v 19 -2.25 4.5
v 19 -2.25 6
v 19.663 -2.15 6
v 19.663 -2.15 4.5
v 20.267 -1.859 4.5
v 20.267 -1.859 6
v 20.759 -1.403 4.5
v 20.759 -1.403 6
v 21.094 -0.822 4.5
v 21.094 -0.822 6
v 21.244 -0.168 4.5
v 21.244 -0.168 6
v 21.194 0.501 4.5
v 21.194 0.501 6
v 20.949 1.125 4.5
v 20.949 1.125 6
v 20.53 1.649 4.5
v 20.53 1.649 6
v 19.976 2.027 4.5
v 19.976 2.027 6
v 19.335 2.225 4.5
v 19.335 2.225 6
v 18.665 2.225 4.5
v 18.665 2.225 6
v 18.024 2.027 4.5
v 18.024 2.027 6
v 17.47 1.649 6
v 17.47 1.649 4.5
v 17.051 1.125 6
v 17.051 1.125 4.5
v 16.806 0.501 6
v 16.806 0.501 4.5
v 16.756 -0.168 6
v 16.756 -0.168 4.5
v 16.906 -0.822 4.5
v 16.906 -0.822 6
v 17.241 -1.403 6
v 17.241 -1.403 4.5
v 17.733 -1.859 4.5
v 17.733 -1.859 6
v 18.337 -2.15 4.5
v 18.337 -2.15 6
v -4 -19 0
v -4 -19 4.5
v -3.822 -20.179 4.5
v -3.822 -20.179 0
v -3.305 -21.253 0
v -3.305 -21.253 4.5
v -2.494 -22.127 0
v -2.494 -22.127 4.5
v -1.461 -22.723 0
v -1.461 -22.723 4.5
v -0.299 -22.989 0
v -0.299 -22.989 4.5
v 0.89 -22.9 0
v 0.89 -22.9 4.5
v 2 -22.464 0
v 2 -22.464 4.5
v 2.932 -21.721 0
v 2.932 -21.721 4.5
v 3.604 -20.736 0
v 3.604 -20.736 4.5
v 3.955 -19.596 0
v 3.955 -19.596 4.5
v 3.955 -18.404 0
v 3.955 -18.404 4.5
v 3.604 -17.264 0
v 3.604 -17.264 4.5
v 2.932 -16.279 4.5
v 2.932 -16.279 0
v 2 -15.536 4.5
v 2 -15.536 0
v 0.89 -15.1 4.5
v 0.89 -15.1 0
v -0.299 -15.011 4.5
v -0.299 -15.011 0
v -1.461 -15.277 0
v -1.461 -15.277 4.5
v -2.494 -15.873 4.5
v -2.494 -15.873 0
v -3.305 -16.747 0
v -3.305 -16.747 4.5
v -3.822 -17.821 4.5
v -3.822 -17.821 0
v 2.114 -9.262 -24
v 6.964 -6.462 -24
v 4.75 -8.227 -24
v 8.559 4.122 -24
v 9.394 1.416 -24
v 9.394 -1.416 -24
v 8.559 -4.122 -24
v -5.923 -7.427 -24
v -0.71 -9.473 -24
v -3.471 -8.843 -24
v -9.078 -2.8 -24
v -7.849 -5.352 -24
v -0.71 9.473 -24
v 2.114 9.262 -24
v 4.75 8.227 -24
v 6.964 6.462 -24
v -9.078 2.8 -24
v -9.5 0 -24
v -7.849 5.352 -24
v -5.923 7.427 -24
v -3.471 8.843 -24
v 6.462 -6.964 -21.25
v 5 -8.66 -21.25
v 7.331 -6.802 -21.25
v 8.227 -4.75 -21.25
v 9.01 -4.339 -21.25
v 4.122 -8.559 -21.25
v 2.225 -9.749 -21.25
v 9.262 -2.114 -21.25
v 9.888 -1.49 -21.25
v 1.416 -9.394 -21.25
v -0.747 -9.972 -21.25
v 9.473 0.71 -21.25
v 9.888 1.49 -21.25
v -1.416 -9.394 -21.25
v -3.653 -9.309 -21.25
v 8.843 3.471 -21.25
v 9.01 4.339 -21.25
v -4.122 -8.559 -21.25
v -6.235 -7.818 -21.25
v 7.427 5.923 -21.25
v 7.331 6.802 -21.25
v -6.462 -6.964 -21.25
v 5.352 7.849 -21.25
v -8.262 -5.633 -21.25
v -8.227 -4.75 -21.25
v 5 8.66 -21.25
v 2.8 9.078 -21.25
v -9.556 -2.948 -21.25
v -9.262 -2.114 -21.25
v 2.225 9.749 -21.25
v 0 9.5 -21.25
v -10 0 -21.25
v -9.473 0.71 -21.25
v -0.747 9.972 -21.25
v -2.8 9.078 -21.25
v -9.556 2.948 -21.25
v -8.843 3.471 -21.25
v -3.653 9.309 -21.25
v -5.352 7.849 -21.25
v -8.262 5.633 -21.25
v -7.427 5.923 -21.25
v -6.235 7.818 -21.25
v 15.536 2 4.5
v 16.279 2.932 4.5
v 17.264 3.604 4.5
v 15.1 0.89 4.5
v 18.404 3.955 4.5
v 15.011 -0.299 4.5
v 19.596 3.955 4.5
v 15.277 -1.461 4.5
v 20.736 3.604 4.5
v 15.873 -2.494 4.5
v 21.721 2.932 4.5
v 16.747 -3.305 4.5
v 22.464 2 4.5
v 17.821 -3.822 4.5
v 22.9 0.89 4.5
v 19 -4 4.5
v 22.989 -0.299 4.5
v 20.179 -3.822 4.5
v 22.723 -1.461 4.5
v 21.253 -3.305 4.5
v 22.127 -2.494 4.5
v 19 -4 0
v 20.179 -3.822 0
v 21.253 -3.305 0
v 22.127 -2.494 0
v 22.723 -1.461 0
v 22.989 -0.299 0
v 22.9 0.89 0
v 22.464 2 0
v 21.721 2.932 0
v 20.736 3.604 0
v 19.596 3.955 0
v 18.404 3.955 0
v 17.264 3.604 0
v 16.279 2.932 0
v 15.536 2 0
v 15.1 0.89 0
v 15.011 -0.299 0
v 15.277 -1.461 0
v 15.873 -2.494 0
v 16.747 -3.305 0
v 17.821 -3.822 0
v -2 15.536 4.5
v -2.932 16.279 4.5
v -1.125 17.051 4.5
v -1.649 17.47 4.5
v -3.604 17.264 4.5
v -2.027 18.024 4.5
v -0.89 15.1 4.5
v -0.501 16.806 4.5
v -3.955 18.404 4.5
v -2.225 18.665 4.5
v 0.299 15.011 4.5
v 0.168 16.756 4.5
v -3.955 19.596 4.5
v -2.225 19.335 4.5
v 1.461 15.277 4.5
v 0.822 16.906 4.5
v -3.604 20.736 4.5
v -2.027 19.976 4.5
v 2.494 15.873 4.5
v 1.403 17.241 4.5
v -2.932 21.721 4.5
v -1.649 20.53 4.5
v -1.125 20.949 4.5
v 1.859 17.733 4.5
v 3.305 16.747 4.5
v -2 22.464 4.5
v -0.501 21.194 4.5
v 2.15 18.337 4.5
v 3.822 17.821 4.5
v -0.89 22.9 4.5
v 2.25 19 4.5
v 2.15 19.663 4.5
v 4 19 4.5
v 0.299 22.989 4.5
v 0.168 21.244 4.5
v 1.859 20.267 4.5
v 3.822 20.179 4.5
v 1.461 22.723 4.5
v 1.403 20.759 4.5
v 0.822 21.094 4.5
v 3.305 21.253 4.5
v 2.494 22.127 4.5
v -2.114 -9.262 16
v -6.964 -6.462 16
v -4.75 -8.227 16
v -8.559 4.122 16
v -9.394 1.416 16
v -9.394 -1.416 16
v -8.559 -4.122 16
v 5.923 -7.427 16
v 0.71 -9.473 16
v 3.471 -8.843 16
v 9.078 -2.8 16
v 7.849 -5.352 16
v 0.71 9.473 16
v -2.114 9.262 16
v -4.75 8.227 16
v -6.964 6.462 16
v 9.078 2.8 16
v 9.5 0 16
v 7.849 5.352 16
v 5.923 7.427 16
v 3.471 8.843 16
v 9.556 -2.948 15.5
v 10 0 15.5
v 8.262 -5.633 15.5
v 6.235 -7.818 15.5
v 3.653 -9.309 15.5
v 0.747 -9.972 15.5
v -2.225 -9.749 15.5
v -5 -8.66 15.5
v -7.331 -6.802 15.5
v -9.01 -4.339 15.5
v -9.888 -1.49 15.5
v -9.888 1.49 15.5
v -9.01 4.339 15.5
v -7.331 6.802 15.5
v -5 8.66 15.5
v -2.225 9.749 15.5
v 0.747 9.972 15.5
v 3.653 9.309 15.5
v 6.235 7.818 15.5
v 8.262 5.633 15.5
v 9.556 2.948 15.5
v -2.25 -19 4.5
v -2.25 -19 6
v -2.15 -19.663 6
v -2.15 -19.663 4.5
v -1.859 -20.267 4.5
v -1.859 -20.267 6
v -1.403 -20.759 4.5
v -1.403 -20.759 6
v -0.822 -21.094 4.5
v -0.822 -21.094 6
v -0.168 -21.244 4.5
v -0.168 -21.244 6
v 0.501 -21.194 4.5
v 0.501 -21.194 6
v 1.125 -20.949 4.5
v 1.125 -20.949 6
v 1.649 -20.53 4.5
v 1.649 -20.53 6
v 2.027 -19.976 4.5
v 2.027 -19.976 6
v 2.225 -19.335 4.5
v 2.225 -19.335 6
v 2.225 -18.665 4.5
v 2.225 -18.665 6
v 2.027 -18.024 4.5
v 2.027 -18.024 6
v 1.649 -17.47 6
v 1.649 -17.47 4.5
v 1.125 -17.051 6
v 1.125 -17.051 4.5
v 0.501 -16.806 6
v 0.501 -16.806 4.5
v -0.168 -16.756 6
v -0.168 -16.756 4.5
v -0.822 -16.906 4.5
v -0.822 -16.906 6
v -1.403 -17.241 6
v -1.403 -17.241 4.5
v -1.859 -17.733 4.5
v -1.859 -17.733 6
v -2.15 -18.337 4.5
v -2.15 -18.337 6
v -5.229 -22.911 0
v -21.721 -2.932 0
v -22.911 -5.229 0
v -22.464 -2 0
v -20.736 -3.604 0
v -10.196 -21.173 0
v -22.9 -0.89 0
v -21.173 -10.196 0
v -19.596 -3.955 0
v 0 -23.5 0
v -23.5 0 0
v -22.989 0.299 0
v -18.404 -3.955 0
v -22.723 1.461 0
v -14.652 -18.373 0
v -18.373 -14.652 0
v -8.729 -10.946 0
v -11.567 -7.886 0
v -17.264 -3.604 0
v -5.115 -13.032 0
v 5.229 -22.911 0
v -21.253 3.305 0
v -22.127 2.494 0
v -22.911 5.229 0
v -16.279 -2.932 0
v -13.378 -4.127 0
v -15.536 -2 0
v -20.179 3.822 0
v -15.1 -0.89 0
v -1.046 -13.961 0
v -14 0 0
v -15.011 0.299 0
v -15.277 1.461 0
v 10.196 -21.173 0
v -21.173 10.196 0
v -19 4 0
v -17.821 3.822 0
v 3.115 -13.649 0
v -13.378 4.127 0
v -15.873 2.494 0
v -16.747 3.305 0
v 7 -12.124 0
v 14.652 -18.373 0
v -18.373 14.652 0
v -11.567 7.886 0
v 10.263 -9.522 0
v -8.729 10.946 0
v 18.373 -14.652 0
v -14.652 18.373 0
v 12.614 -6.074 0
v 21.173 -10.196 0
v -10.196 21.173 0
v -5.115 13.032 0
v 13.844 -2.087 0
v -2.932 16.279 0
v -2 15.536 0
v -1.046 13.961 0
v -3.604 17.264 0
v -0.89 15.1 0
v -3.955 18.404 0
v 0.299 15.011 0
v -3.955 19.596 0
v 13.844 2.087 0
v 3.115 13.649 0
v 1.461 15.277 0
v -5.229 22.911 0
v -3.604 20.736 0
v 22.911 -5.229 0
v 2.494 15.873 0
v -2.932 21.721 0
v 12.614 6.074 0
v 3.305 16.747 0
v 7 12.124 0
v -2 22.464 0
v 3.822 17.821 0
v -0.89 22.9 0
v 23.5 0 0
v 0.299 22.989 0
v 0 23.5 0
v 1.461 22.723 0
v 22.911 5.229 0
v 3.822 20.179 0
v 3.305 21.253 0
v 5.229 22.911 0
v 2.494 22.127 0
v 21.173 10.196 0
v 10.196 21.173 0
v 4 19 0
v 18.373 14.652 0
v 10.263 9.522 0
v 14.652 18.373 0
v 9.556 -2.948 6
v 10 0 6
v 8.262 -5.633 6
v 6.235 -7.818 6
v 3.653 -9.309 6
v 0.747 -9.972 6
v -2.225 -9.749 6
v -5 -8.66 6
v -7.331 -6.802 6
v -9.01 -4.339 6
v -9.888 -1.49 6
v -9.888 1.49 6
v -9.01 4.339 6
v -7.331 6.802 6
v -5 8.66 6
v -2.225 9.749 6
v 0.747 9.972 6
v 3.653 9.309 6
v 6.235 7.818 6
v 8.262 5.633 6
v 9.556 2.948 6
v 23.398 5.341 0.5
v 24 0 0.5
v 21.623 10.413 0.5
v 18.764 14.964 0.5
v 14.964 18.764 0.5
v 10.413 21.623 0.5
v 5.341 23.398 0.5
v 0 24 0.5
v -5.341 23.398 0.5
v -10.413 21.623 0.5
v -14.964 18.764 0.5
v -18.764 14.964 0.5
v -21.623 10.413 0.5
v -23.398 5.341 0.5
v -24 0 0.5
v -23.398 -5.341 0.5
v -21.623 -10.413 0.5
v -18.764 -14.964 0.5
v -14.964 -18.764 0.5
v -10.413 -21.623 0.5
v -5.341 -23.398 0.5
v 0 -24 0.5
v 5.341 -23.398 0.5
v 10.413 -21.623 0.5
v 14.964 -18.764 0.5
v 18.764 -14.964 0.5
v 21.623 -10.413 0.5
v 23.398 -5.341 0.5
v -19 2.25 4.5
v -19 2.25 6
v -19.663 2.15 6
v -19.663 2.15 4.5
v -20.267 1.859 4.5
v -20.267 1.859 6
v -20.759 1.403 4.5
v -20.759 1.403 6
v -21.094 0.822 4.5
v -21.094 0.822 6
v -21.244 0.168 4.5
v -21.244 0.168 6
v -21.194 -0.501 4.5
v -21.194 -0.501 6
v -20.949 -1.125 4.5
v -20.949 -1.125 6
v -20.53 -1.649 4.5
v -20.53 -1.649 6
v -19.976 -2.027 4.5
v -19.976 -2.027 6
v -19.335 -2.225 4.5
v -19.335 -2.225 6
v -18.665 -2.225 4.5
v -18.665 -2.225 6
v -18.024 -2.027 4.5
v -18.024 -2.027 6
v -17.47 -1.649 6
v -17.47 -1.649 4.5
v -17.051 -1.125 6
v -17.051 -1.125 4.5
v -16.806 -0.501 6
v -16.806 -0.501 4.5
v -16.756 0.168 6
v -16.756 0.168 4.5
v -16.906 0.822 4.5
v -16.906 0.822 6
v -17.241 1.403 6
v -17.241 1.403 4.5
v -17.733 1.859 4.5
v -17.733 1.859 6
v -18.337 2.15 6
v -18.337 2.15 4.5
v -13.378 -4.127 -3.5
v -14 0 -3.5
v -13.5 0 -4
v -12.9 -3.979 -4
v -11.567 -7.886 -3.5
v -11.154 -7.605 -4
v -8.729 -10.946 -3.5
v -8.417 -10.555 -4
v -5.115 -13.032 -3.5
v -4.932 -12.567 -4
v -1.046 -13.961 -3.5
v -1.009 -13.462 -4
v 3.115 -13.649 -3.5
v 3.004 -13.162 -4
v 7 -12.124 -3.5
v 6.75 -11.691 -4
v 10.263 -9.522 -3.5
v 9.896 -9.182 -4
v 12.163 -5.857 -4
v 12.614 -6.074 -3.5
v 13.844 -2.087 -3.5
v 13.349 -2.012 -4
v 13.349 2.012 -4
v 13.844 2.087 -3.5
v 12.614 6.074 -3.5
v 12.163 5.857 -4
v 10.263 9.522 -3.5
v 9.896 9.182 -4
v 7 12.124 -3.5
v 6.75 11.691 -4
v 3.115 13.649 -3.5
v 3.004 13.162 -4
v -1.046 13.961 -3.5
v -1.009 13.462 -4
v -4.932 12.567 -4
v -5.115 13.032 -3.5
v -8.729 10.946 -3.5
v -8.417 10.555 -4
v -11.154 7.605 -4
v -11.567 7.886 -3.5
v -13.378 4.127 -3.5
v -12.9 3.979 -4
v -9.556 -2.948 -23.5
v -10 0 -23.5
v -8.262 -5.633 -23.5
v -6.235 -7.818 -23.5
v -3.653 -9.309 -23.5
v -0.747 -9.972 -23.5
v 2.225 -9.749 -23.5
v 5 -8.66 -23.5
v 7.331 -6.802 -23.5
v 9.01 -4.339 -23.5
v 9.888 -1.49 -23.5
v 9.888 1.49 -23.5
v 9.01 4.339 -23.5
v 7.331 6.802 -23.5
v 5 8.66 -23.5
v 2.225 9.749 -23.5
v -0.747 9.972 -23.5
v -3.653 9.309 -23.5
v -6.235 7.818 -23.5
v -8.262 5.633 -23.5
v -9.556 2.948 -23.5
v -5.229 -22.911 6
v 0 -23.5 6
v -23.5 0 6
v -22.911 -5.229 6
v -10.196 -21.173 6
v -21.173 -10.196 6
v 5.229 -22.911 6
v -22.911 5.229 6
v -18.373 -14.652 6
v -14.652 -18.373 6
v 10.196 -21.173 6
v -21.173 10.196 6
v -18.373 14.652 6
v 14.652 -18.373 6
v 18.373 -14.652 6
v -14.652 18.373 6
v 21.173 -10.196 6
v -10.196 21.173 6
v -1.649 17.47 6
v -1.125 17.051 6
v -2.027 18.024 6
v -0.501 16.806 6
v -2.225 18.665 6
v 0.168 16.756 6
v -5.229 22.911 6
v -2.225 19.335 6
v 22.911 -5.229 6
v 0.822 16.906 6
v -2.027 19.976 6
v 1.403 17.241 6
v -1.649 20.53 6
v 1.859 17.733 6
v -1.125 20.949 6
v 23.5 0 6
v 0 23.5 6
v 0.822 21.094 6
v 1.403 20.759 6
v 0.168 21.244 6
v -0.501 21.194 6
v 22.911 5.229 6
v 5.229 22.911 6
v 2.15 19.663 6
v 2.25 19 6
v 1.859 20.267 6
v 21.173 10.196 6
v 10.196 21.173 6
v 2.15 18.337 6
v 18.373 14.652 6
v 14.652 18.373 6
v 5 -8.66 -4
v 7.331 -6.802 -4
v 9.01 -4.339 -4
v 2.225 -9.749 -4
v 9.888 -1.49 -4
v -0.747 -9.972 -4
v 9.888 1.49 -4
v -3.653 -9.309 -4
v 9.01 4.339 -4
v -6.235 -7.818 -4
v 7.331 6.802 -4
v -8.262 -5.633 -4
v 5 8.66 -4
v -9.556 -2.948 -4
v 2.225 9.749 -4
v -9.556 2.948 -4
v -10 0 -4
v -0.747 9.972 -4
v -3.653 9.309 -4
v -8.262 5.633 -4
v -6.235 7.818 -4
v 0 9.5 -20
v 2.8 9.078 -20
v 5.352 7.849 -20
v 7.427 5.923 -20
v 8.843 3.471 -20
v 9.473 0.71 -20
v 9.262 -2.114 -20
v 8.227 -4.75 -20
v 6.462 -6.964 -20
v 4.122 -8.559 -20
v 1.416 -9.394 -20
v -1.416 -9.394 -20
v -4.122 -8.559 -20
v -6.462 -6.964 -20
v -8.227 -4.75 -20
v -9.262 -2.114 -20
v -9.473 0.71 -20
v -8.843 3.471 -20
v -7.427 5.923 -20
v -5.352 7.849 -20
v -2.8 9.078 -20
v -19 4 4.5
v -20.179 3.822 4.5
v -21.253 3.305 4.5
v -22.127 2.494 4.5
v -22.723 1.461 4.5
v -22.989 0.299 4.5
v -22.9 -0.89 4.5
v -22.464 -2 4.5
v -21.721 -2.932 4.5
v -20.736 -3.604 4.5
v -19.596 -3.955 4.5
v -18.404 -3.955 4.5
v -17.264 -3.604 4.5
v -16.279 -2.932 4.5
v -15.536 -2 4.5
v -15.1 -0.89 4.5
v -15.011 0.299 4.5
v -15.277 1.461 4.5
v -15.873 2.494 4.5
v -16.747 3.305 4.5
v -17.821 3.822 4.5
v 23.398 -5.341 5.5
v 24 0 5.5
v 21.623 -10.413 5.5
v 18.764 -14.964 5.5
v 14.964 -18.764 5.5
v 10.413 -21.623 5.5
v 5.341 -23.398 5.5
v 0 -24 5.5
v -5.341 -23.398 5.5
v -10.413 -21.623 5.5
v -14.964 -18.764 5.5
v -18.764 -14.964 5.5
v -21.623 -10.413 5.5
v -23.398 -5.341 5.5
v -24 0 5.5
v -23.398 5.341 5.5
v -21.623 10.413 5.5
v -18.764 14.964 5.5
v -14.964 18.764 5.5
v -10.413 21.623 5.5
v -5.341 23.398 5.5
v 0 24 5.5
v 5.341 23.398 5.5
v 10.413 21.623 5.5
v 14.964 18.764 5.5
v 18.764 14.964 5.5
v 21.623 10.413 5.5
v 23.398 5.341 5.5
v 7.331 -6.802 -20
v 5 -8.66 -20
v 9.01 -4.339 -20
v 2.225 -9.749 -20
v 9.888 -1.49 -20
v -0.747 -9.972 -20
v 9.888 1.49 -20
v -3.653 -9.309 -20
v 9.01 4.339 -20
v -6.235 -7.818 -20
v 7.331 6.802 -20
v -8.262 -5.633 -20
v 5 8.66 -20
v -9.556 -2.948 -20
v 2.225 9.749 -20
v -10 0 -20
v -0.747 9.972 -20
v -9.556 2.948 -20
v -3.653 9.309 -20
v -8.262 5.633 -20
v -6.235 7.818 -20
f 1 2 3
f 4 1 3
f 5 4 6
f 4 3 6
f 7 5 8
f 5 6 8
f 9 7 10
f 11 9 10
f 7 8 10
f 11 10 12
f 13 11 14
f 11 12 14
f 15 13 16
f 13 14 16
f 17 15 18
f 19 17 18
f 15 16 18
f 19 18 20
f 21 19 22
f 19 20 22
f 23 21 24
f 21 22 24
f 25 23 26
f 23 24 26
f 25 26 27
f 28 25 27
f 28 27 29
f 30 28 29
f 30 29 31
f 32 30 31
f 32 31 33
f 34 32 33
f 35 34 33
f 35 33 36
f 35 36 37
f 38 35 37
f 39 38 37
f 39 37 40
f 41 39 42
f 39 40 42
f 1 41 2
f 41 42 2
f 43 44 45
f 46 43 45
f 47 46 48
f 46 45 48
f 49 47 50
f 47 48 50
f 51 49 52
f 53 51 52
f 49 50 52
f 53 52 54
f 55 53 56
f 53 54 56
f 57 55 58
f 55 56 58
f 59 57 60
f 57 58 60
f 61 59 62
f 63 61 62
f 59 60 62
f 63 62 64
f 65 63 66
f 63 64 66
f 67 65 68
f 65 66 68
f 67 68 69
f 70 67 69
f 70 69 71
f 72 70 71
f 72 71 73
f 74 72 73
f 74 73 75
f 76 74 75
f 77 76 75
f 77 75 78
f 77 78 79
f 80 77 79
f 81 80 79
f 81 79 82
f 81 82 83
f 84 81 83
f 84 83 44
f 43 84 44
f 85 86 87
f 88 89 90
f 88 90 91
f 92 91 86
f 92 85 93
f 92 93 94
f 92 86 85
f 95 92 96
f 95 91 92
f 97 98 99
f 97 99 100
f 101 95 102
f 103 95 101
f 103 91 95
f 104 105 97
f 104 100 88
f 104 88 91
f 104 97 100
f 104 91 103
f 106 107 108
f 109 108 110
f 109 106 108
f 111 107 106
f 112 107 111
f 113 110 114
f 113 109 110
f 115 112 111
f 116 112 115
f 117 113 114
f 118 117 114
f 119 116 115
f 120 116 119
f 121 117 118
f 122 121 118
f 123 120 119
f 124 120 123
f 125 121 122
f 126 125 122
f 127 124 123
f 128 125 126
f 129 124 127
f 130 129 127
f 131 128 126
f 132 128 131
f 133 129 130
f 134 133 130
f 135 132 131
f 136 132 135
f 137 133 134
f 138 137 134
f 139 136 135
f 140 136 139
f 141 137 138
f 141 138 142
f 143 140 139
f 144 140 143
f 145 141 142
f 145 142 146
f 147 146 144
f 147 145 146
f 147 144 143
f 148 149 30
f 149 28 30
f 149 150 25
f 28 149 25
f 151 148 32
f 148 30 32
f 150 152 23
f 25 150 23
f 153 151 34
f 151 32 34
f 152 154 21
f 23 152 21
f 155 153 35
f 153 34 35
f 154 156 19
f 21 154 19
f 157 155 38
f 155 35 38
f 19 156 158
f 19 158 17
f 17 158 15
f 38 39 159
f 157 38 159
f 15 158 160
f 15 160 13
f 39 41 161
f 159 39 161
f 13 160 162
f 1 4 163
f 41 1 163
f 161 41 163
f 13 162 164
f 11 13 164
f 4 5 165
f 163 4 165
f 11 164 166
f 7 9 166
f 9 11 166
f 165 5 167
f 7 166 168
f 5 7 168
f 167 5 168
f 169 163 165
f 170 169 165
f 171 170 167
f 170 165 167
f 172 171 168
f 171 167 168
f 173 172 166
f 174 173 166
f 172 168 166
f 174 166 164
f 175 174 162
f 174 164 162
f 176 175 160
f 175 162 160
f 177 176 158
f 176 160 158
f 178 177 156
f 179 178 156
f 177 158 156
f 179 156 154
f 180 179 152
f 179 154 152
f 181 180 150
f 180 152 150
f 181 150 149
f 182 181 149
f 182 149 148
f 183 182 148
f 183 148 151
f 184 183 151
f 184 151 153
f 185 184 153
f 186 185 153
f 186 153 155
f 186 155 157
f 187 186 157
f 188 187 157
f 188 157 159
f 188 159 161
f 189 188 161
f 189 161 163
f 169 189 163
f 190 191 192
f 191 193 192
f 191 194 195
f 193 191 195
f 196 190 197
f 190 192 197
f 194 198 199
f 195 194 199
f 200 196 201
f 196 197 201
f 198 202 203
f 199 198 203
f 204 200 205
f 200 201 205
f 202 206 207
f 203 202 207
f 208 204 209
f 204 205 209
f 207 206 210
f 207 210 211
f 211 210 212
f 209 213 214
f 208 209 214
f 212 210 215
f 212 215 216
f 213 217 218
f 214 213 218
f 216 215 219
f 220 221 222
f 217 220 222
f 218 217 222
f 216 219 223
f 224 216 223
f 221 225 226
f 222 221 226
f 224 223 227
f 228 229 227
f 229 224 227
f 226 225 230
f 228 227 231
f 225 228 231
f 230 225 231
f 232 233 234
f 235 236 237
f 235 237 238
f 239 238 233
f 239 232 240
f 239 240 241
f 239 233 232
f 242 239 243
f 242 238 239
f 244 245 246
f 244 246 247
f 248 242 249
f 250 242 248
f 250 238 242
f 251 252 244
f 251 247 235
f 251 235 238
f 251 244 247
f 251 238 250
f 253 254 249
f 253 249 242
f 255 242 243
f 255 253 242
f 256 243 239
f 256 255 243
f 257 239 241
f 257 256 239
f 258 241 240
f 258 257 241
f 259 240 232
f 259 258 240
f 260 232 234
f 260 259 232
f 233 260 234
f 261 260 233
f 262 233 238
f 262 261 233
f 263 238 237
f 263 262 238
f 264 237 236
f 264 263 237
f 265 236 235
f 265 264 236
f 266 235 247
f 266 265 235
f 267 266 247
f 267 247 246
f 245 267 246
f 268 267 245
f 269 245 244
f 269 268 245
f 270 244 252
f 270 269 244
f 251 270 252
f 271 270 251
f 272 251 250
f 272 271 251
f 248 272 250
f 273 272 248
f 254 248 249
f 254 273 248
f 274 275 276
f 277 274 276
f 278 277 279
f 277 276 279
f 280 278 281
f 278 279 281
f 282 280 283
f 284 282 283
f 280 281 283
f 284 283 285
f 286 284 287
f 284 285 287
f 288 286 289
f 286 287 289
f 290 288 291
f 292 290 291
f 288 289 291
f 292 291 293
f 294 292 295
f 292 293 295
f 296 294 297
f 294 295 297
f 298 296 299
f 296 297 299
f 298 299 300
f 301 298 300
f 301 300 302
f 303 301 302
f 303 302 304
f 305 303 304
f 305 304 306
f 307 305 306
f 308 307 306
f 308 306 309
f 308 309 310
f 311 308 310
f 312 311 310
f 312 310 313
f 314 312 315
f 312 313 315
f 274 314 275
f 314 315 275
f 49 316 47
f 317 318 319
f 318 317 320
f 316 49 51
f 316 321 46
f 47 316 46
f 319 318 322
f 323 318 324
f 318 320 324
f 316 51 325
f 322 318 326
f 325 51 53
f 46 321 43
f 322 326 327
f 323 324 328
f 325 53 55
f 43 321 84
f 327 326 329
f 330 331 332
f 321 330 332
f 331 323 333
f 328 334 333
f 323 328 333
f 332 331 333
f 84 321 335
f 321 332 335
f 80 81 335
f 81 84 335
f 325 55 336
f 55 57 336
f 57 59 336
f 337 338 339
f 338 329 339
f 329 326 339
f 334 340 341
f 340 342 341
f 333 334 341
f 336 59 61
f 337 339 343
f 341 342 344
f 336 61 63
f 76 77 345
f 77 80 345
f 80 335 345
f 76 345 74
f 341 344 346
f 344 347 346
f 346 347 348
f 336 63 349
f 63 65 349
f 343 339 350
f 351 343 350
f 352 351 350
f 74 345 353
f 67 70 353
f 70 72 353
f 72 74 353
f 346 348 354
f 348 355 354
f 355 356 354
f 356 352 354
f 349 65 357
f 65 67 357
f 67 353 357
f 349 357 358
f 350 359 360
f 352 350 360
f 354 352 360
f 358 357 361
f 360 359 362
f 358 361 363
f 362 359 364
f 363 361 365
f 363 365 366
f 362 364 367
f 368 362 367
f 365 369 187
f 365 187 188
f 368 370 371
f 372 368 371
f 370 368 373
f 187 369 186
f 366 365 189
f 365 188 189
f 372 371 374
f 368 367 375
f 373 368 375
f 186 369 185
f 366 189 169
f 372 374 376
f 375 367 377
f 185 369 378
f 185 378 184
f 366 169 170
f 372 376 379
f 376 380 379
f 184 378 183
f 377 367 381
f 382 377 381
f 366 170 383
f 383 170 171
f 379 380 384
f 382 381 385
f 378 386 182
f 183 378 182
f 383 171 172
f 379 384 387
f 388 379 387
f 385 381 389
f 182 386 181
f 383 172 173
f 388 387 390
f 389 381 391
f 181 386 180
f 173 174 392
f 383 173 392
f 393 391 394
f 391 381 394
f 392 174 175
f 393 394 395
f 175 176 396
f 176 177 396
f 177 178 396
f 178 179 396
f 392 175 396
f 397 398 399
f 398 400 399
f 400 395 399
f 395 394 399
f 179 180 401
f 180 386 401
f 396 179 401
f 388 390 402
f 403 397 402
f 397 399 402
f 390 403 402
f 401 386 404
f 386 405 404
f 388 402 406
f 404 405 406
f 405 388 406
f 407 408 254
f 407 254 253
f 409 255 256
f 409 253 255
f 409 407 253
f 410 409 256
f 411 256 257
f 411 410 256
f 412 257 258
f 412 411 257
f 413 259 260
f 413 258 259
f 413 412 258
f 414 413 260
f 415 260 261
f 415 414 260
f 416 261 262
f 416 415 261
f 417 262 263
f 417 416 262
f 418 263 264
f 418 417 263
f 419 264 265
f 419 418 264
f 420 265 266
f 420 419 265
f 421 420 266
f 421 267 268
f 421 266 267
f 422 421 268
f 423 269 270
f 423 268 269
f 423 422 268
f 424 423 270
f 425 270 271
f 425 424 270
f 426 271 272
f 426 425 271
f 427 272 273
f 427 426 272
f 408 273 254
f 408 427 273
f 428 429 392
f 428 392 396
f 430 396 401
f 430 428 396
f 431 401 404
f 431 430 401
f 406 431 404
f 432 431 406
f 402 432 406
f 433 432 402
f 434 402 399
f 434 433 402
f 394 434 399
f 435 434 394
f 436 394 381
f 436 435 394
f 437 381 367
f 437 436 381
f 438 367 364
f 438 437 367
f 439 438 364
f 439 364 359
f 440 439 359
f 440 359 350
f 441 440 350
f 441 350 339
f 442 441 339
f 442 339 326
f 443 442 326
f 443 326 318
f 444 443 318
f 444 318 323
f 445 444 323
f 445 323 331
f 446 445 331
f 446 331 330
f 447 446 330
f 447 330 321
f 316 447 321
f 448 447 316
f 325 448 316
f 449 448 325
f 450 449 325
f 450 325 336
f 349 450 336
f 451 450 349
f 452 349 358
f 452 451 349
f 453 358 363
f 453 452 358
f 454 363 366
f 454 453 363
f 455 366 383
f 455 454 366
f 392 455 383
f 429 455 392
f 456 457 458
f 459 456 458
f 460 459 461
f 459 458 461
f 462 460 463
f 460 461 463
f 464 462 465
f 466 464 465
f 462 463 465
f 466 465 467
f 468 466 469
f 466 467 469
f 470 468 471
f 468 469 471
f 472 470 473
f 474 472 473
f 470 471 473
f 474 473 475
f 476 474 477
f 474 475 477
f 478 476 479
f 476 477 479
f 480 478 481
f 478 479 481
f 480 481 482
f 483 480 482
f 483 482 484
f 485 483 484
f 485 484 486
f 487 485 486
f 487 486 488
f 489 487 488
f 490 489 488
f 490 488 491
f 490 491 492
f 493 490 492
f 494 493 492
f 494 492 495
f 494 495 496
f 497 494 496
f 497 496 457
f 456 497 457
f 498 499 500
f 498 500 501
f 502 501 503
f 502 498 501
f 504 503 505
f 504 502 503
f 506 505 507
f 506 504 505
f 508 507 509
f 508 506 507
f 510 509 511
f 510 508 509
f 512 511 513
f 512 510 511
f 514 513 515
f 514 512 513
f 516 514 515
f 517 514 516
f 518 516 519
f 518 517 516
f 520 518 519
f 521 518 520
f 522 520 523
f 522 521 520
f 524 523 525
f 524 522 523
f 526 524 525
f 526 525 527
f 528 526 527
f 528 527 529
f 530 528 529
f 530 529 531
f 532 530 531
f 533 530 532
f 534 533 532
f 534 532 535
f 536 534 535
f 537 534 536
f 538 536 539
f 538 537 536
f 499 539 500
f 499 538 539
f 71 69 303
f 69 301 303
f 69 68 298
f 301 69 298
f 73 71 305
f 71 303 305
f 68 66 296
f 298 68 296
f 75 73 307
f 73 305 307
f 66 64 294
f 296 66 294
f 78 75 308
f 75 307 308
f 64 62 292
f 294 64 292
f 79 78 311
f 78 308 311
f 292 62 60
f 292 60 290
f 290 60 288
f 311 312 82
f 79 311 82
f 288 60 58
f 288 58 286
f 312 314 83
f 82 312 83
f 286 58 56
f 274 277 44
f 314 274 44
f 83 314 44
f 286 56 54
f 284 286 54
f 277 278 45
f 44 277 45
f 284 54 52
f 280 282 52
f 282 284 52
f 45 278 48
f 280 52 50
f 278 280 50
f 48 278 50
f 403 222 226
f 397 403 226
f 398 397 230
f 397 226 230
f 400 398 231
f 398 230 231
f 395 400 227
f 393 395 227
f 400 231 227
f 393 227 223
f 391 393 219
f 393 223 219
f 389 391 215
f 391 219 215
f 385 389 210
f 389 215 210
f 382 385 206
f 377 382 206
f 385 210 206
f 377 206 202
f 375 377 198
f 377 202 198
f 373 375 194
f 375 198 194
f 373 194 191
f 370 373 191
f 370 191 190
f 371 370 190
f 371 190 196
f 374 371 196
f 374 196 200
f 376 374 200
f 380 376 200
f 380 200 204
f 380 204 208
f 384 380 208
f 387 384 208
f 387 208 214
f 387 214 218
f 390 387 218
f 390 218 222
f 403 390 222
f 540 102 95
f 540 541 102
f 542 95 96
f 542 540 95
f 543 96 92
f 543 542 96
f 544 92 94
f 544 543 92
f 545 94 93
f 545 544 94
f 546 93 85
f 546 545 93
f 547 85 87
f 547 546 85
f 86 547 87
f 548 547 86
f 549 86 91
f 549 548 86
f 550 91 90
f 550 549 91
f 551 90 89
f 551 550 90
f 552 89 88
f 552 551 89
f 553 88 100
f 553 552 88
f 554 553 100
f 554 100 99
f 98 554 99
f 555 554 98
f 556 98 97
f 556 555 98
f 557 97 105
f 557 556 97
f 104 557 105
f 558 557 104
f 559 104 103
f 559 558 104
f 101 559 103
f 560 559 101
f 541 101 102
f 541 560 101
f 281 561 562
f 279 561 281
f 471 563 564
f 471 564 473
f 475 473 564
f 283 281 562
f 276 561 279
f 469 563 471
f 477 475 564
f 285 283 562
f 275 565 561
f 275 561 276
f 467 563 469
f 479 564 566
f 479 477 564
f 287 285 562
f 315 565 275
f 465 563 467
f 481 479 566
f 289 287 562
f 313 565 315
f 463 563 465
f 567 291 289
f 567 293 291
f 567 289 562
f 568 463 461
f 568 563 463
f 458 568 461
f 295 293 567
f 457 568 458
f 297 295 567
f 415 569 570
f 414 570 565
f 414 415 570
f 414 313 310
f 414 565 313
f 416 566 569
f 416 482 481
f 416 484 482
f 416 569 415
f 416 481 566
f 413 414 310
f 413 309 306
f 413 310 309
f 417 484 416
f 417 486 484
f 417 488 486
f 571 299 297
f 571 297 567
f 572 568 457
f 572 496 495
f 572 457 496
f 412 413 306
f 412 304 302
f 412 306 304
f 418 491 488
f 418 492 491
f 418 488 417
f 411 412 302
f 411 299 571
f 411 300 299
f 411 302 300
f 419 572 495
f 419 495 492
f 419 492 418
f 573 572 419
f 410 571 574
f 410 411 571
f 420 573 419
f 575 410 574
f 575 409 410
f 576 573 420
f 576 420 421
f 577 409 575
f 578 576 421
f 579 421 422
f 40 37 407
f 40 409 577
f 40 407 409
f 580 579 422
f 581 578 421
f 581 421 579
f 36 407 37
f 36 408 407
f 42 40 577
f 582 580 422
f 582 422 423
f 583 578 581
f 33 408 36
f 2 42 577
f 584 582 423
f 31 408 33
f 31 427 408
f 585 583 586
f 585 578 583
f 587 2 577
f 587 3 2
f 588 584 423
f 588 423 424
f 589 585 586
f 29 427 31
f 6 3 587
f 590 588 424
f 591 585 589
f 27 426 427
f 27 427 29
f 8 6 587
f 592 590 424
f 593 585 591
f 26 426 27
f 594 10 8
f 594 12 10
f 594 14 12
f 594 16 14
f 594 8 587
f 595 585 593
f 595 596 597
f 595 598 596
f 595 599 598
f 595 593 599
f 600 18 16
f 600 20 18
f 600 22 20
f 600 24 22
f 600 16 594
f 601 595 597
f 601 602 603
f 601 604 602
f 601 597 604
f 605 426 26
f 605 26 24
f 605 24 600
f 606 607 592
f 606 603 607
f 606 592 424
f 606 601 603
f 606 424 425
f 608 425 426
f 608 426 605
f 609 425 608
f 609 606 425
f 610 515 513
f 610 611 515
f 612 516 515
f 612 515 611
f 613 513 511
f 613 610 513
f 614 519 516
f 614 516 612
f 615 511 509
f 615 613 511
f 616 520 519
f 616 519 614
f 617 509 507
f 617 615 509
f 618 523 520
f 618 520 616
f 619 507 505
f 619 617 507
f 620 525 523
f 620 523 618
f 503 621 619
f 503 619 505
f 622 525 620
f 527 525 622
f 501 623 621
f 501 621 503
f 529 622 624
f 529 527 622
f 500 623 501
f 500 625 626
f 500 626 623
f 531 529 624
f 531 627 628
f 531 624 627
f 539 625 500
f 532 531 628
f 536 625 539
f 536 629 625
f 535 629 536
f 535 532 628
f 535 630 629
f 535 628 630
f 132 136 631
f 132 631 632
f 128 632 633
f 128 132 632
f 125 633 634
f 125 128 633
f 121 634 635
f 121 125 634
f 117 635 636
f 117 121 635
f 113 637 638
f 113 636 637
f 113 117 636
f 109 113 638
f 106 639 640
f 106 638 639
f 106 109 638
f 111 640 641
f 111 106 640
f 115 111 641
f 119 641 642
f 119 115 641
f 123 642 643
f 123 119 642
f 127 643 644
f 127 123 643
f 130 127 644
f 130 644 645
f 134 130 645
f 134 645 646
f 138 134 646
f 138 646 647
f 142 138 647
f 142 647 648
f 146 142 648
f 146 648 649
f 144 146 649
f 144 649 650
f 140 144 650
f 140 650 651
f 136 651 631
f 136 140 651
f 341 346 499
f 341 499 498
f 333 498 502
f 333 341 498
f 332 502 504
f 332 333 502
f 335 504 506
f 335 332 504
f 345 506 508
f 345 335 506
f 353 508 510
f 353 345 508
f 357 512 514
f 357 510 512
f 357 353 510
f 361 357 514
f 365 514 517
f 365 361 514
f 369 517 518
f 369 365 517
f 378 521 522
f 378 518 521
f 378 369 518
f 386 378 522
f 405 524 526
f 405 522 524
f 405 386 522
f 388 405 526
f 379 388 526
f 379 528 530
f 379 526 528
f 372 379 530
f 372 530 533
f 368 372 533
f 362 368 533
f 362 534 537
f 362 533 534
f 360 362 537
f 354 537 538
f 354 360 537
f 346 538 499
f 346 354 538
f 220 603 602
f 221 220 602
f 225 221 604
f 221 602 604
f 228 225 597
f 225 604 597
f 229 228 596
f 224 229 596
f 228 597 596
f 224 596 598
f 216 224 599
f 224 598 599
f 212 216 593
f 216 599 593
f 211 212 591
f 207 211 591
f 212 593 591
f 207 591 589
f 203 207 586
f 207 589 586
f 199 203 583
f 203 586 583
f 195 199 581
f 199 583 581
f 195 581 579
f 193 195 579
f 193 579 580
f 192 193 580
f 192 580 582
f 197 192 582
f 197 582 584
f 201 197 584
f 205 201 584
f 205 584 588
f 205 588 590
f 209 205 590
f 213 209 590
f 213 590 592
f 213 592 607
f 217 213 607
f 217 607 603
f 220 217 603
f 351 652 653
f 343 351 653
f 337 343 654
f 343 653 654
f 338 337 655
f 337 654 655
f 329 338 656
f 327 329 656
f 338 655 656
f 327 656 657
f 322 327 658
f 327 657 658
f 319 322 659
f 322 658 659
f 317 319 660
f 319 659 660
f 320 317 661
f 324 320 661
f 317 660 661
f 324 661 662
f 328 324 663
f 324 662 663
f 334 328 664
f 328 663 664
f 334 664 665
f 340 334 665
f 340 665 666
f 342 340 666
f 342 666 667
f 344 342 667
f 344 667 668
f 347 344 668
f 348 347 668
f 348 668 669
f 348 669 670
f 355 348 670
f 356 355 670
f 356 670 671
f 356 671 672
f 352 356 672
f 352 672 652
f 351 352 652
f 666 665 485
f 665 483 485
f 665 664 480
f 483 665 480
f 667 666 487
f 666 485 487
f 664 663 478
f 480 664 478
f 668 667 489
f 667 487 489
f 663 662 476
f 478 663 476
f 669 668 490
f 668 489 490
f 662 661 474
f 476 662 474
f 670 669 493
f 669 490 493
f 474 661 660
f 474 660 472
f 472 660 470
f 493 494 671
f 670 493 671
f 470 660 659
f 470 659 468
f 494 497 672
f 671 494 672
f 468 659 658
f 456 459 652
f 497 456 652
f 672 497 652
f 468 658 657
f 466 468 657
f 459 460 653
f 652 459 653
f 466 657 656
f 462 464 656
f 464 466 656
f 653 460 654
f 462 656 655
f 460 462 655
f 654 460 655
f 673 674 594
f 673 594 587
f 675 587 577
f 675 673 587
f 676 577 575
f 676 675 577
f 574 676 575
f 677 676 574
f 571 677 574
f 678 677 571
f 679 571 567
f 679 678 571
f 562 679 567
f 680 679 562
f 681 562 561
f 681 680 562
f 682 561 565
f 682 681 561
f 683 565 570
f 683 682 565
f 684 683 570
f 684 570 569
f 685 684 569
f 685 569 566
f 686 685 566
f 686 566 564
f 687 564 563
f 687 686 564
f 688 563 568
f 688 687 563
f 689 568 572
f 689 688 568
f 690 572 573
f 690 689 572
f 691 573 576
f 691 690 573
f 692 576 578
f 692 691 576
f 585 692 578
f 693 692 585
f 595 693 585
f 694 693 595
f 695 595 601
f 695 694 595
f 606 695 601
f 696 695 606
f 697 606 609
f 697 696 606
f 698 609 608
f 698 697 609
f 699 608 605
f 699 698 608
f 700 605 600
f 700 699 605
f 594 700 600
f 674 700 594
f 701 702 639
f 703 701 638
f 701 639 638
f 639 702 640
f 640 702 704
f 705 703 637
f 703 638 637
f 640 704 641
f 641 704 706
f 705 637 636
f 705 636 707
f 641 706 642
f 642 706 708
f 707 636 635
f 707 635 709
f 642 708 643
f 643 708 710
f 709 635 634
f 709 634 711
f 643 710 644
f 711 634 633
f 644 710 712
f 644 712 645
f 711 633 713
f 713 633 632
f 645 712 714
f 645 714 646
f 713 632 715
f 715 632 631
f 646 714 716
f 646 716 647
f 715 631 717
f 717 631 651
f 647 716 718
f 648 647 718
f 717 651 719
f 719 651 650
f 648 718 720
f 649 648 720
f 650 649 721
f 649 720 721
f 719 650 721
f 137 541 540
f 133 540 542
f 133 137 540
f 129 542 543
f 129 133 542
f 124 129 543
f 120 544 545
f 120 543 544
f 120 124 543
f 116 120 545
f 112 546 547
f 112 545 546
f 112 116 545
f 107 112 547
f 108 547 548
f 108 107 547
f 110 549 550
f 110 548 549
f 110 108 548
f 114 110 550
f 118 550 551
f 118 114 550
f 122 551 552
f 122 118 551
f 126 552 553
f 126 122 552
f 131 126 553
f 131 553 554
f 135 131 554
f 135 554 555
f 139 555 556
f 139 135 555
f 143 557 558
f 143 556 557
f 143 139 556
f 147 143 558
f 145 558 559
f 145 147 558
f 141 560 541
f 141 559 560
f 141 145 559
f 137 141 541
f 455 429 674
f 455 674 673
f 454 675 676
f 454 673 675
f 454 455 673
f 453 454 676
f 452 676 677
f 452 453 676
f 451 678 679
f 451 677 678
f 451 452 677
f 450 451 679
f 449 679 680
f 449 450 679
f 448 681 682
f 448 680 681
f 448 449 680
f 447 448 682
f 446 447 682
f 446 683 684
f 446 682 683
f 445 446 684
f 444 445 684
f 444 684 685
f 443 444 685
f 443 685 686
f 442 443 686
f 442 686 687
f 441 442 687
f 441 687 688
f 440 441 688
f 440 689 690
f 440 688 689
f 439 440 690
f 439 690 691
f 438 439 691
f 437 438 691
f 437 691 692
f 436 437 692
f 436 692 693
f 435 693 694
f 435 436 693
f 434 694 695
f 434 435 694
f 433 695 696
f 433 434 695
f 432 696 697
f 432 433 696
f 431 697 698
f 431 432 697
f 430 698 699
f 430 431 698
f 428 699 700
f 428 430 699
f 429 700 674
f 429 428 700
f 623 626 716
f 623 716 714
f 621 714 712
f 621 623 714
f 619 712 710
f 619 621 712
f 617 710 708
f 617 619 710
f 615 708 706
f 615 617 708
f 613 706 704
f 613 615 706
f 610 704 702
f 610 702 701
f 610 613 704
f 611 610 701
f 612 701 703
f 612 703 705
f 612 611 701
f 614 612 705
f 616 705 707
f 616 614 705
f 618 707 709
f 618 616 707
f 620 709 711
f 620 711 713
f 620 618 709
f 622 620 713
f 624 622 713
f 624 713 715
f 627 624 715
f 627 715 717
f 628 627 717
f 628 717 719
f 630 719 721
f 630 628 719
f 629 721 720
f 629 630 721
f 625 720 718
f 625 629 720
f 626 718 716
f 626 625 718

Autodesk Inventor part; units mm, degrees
ref_plane "YZ Plane" through (0, 0, 0) normal (1, 0, 0) x (0, 1, 0)
ref_plane "XZ Plane" through (0, 0, 0) normal (0, 1, 0) x (-1, 0, 0)
ref_plane "XY Plane" through (0, 0, 0) normal (0, 0, 1) x (1, 0, 0)
sketch "Esboço1" plane through (0, 0, 0) normal (0, 0, 1) x (1, 0, 0)
  circle A0 centre (0, 0) radius 24
  dimension "d0" = 48
extrude "Extrusão1" add sketch "Esboço1" along normal blind 6
sketch "Esboço2" plane through (0, 0, 6) normal (0, 0, 1) x (1, 0, 0)
  circle A0 centre (0, 0) radius 24 projected
  circle A1 centre (0, 0) radius 10
  dimension "d3" = 20
extrude "Extrusão2" add sketch "Esboço2" along normal blind 10 contours A1
sketch "Esboço3" plane through (0, 0, 0) normal (0, 0, -1) x (-1, 0, 0)
  circle A0 centre (0, 0) radius 24 projected
  circle A1 centre (0, 0) radius 14
  dimension "d6" = 28
extrude "Extrusão3" add sketch "Esboço3" along normal blind 4 contours A1
sketch "Esboço4" plane through (0, 0, -4) normal (0, 0, -1) x (-1, 0, 0)
  circle A0 centre (0, 0) radius 14 projected
  circle A1 centre (0, 0) radius 10
  dimension "d9" = 20
extrude "Extrusão4" add sketch "Esboço4" along normal blind 20 contours A1
sketch "Esboço5" plane through (0, 0, 0) normal (1, 0, 0) x (0, 1, 0)
  line L0 (10, -20) -> (9.5, -20)
  line L1 (9.5, -20) -> (9.5, -21.25)
  line L2 (9.5, -21.25) -> (10, -21.25)
  line L3 (10, -21.25) -> (10, -20)
  line L4 (-10, -24) -> (10, -24) projected
  line L5 (0, -32) -> (0, 24) projected
  point P0 (0, 0)
  dimension "d12" = 1.25
  dimension "d13" = 4
  dimension "d14" = 9.5
revolve "Revolução1" cut sketch "Esboço5" angle 360 about axis through (0, 0, -10) along (0, 0, 1)
sketch "Esboço6" plane through (0, 0, 0) normal (0, 0, -1) x (-1, 0, 0)
  circle A0 centre (0, 0) radius 14 projected
  point P0 (19, 0)
  dimension "d16" = 19
hole "Furo1" at (-19, 0, 0) direction (0, 0, 1) diameter 4.5 end through all counterbore diameter 8 counterbore depth 4.5 clearance for "Socket Head Cap Screw DIN EN ISO 4762" size "M4" standard "DIN"
pattern_circular "Padrão circular1" count 4 over 360 about axis through (0, 0, 0) along (0, 0, 1) of "Furo1"
chamfer "Chanfro1" distance 0.5 angle 45 5 edges at (-10, 0, 16) (-24, 0, 6) (-24, 0, 0) (14, 0, -4) (10, 0, -24)
